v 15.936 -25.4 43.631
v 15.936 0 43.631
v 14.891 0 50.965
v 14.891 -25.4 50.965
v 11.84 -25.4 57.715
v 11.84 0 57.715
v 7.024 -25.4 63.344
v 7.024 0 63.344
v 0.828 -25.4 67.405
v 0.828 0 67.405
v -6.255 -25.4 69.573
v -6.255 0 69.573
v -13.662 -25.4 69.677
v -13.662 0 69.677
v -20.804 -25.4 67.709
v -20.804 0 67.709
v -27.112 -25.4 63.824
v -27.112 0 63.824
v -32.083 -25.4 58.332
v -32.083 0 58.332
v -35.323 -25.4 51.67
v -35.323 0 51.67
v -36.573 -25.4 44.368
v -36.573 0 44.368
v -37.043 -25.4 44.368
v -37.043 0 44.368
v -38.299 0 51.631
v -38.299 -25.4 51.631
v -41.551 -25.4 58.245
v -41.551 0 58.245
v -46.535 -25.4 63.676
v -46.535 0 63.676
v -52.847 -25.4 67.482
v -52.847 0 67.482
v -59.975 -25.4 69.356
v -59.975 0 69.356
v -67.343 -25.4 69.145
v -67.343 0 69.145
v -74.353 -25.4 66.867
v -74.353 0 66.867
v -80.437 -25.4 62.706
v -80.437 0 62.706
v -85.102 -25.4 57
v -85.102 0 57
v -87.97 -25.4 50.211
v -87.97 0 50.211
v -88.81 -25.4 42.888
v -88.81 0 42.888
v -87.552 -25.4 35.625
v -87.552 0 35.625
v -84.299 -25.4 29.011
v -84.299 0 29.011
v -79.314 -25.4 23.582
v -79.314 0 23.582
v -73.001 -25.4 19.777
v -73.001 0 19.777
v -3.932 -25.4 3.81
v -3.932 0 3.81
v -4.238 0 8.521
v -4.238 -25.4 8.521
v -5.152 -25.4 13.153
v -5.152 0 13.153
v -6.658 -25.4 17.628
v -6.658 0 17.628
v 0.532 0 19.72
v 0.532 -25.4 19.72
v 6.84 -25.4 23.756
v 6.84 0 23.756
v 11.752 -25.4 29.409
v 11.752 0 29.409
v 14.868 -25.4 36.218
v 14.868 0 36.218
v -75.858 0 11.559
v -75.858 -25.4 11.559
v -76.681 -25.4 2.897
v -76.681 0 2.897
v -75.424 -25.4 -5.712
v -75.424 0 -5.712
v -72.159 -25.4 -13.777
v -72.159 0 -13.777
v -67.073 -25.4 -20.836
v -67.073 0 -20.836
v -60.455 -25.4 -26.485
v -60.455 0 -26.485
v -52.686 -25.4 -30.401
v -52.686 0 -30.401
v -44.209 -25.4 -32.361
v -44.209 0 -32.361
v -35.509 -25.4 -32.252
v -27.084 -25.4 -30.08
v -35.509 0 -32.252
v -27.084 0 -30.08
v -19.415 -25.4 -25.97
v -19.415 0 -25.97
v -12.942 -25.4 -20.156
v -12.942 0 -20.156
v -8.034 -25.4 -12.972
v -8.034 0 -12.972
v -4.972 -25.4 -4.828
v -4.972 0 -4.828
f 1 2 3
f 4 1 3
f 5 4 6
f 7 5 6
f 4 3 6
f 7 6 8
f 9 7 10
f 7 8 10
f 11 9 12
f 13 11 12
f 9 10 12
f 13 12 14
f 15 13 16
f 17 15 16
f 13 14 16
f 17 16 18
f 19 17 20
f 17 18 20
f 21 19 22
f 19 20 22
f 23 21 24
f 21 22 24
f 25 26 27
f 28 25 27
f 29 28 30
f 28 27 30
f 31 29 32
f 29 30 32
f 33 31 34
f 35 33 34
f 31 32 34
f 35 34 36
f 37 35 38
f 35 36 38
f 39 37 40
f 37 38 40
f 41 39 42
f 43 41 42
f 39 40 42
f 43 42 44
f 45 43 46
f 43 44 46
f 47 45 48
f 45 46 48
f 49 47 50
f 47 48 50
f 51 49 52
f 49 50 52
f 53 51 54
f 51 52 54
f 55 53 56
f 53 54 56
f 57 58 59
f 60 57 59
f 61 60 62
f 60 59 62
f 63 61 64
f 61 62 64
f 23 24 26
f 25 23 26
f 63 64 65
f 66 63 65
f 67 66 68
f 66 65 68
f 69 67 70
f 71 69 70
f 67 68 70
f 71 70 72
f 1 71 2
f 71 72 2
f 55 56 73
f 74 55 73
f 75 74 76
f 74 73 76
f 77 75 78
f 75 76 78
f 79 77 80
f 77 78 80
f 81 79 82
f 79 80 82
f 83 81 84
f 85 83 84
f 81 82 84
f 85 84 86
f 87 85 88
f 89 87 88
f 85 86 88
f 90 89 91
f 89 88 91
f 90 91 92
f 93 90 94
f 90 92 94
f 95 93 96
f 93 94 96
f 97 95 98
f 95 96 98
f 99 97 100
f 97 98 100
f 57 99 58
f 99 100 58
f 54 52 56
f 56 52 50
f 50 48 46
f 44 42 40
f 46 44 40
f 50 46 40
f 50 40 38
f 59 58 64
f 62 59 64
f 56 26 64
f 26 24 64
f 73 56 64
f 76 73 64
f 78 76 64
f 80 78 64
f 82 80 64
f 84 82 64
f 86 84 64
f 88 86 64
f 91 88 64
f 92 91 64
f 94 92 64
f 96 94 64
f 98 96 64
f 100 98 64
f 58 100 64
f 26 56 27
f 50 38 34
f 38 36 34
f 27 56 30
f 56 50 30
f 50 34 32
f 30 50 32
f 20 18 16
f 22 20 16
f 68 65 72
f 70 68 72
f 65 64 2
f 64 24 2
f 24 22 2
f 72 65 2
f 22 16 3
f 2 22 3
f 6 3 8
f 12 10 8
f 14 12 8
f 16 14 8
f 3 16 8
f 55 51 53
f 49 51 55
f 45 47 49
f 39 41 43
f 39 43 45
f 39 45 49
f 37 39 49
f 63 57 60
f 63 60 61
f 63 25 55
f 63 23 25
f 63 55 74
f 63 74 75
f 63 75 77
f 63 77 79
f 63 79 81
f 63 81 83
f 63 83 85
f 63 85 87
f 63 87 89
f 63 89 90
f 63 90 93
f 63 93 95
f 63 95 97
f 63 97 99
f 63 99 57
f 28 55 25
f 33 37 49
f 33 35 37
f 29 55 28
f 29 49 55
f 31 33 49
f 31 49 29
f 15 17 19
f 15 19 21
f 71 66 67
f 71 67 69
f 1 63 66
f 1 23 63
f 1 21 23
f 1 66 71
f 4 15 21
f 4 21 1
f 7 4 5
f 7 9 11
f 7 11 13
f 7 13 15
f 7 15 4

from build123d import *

# Parameters (mm, degrees)
F1_DEPTH = 25.4


with BuildPart() as f1:
    # F0 (on Front) → F1 (new body)
    with BuildSketch(Plane.XZ):
        with BuildLine():
            ThreePointArc((-37.2795093382, 40.0635529992), (-37.0944265378, 41.8428324334), (-37.0326339638, 43.6306446791))
            ThreePointArc((-37.0326339638, 43.6306446791), (-37.0352597257, 43.9993926792), (-37.0431364787, 44.3680658937))
            Line((-37.0431364787, 44.3680658937), (-59.2393539846, 44.3680658937))
            Line((-59.2393539846, 44.3680658937), (-59.2393539846, 34.8789981649))
            ThreePointArc((-59.2393539846, 34.8789981649), (-48.6715325086, 39.2167813917), (-37.2795093382, 40.0635529992))
        make_face()
        with BuildLine():
            ThreePointArc((-37.0431364787, 44.3680658937), (-37.0352597257, 43.9993926792), (-37.0326339638, 43.6306446791))
            ThreePointArc((-37.0326339638, 43.6306446791), (-37.0944265378, 41.8428324334), (-37.2795093382, 40.0635529992))
            ThreePointArc((-37.2795093382, 40.0635529992), (-36.8032339812, 40.0205567646), (-36.3275649384, 39.9713038099))
            ThreePointArc((-36.3275649384, 39.9713038099), (-36.5428213794, 42.1645221032), (-36.573424985, 44.3680658936))
            Line((-36.573424985, 44.3680658937), (-37.0431364787, 44.3680658937))
        make_face()
        with BuildLine():
            Line((-59.2393539846, 44.3680658937), (-37.0431364787, 44.3680658937))
            ThreePointArc((-37.0431364787, 44.3680658937), (-77.5434180545, 65.0043168763), (-73.0012082171, 19.7771569817))
            ThreePointArc((-73.0012082171, 19.7771569817), (-67.2022274173, 28.3140227514), (-59.2393539846, 34.8789981649))
            Line((-59.2393539846, 34.8789981649), (-59.2393539846, 44.3680658937))
        make_face()
        with BuildLine():
            ThreePointArc((-36.3275649384, 39.9713038099), (-36.8032339812, 40.0205567646), (-37.2795093382, 40.0635529992))
            ThreePointArc((-37.2795093382, 40.0635529992), (-44.4588292576, 25.4802541483), (-58.915556877, 18.0493547131))
            Line((-58.915556877, 18.0493547131), (-16.2551814161, 18.0493547131))
            ThreePointArc((-16.2551814161, 18.0493547131), (-29.6914752573, 25.897095458), (-36.3275649384, 39.9713038099))
        make_face()
        with BuildLine():
            ThreePointArc((-58.915556877, 18.0493547131), (-44.4588292576, 25.4802541483), (-37.2795093382, 40.0635529992))
            ThreePointArc((-37.2795093382, 40.0635529992), (-48.6715325086, 39.2167813917), (-59.2393539846, 34.8789981649))
            Line((-59.2393539846, 34.8789981649), (-59.2393539846, 18.0493547131))
            Line((-59.2393539846, 18.0493547131), (-58.915556877, 18.0493547131))
        make_face()
        with BuildLine():
            ThreePointArc((-59.2393539846, 34.8789981649), (-67.2022274173, 28.3140227514), (-73.0012082171, 19.7771569817))
            ThreePointArc((-73.0012082171, 19.7771569817), (-66.0790584232, 17.9294636931), (-58.915556877, 18.0493547131))
            Line((-58.915556877, 18.0493547131), (-59.2393539846, 18.0493547131))
            Line((-59.2393539846, 18.0493547131), (-59.2393539846, 34.8789981649))
        make_face()
        with BuildLine():
            ThreePointArc((-58.915556877, 18.0493547131), (-66.0790584232, 17.9294636931), (-73.0012082171, 19.7771569817))
            ThreePointArc((-73.0012082171, 19.7771569817), (-48.5063899421, -31.6353638875), (-3.9320745419, 3.8100001402))
            ThreePointArc((-3.9320745419, 3.8100001402), (-4.620150317, 10.8521017976), (-6.6583498303, 17.6278221851))
            ThreePointArc((-6.6583498303, 17.6278221851), (-11.4762045796, 17.3960309275), (-16.2551814161, 18.0493547131))
            Line((-16.2551814161, 18.0493547131), (-58.915556877, 18.0493547131))
        make_face()
        with BuildLine():
            Line((-16.2551814161, 44.3680658937), (-36.573424985, 44.3680658937))
            ThreePointArc((-36.573424985, 44.3680658936), (-36.5428213794, 42.1645221032), (-36.3275649384, 39.9713038099))
            ThreePointArc((-36.3275649384, 39.9713038099), (-25.6065541108, 37.085516119), (-16.2551814161, 31.1005622773))
            Line((-16.2551814161, 31.1005622773), (-16.2551814161, 44.3680658937))
        make_face()
        with BuildLine():
            ThreePointArc((15.9360373073, 43.6306446791), (-9.9551248939, 69.8879647074), (-36.573424985, 44.3680658936))
            Line((-36.573424985, 44.3680658937), (-16.2551814161, 44.3680658937))
            Line((-16.2551814161, 44.3680658937), (-16.2551814161, 31.1005622773))
            ThreePointArc((-16.2551814161, 31.1005622773), (-10.6808873976, 24.916861741), (-6.6583498303, 17.6278221851))
            ThreePointArc((-6.6583498303, 17.6278221851), (9.4983266183, 26.4067288367), (15.9360373073, 43.6306446791))
        make_face()
        with BuildLine():
            ThreePointArc((-16.2551814161, 31.1005622773), (-25.6065541108, 37.085516119), (-36.3275649384, 39.9713038099))
            ThreePointArc((-36.3275649384, 39.9713038099), (-29.6914752573, 25.897095458), (-16.2551814161, 18.0493547131))
            Line((-16.2551814161, 18.0493547131), (-16.2551814161, 31.1005622773))
        make_face()
        with BuildLine():
            Line((-16.2551814161, 31.1005622773), (-16.2551814161, 18.0493547131))
            ThreePointArc((-16.2551814161, 18.0493547131), (-11.4762045796, 17.3960309275), (-6.6583498303, 17.6278221851))
            ThreePointArc((-6.6583498303, 17.6278221851), (-10.6808873976, 24.916861741), (-16.2551814161, 31.1005622773))
        make_face()
    extrude(amount=F1_DEPTH)


solid = f1.part
